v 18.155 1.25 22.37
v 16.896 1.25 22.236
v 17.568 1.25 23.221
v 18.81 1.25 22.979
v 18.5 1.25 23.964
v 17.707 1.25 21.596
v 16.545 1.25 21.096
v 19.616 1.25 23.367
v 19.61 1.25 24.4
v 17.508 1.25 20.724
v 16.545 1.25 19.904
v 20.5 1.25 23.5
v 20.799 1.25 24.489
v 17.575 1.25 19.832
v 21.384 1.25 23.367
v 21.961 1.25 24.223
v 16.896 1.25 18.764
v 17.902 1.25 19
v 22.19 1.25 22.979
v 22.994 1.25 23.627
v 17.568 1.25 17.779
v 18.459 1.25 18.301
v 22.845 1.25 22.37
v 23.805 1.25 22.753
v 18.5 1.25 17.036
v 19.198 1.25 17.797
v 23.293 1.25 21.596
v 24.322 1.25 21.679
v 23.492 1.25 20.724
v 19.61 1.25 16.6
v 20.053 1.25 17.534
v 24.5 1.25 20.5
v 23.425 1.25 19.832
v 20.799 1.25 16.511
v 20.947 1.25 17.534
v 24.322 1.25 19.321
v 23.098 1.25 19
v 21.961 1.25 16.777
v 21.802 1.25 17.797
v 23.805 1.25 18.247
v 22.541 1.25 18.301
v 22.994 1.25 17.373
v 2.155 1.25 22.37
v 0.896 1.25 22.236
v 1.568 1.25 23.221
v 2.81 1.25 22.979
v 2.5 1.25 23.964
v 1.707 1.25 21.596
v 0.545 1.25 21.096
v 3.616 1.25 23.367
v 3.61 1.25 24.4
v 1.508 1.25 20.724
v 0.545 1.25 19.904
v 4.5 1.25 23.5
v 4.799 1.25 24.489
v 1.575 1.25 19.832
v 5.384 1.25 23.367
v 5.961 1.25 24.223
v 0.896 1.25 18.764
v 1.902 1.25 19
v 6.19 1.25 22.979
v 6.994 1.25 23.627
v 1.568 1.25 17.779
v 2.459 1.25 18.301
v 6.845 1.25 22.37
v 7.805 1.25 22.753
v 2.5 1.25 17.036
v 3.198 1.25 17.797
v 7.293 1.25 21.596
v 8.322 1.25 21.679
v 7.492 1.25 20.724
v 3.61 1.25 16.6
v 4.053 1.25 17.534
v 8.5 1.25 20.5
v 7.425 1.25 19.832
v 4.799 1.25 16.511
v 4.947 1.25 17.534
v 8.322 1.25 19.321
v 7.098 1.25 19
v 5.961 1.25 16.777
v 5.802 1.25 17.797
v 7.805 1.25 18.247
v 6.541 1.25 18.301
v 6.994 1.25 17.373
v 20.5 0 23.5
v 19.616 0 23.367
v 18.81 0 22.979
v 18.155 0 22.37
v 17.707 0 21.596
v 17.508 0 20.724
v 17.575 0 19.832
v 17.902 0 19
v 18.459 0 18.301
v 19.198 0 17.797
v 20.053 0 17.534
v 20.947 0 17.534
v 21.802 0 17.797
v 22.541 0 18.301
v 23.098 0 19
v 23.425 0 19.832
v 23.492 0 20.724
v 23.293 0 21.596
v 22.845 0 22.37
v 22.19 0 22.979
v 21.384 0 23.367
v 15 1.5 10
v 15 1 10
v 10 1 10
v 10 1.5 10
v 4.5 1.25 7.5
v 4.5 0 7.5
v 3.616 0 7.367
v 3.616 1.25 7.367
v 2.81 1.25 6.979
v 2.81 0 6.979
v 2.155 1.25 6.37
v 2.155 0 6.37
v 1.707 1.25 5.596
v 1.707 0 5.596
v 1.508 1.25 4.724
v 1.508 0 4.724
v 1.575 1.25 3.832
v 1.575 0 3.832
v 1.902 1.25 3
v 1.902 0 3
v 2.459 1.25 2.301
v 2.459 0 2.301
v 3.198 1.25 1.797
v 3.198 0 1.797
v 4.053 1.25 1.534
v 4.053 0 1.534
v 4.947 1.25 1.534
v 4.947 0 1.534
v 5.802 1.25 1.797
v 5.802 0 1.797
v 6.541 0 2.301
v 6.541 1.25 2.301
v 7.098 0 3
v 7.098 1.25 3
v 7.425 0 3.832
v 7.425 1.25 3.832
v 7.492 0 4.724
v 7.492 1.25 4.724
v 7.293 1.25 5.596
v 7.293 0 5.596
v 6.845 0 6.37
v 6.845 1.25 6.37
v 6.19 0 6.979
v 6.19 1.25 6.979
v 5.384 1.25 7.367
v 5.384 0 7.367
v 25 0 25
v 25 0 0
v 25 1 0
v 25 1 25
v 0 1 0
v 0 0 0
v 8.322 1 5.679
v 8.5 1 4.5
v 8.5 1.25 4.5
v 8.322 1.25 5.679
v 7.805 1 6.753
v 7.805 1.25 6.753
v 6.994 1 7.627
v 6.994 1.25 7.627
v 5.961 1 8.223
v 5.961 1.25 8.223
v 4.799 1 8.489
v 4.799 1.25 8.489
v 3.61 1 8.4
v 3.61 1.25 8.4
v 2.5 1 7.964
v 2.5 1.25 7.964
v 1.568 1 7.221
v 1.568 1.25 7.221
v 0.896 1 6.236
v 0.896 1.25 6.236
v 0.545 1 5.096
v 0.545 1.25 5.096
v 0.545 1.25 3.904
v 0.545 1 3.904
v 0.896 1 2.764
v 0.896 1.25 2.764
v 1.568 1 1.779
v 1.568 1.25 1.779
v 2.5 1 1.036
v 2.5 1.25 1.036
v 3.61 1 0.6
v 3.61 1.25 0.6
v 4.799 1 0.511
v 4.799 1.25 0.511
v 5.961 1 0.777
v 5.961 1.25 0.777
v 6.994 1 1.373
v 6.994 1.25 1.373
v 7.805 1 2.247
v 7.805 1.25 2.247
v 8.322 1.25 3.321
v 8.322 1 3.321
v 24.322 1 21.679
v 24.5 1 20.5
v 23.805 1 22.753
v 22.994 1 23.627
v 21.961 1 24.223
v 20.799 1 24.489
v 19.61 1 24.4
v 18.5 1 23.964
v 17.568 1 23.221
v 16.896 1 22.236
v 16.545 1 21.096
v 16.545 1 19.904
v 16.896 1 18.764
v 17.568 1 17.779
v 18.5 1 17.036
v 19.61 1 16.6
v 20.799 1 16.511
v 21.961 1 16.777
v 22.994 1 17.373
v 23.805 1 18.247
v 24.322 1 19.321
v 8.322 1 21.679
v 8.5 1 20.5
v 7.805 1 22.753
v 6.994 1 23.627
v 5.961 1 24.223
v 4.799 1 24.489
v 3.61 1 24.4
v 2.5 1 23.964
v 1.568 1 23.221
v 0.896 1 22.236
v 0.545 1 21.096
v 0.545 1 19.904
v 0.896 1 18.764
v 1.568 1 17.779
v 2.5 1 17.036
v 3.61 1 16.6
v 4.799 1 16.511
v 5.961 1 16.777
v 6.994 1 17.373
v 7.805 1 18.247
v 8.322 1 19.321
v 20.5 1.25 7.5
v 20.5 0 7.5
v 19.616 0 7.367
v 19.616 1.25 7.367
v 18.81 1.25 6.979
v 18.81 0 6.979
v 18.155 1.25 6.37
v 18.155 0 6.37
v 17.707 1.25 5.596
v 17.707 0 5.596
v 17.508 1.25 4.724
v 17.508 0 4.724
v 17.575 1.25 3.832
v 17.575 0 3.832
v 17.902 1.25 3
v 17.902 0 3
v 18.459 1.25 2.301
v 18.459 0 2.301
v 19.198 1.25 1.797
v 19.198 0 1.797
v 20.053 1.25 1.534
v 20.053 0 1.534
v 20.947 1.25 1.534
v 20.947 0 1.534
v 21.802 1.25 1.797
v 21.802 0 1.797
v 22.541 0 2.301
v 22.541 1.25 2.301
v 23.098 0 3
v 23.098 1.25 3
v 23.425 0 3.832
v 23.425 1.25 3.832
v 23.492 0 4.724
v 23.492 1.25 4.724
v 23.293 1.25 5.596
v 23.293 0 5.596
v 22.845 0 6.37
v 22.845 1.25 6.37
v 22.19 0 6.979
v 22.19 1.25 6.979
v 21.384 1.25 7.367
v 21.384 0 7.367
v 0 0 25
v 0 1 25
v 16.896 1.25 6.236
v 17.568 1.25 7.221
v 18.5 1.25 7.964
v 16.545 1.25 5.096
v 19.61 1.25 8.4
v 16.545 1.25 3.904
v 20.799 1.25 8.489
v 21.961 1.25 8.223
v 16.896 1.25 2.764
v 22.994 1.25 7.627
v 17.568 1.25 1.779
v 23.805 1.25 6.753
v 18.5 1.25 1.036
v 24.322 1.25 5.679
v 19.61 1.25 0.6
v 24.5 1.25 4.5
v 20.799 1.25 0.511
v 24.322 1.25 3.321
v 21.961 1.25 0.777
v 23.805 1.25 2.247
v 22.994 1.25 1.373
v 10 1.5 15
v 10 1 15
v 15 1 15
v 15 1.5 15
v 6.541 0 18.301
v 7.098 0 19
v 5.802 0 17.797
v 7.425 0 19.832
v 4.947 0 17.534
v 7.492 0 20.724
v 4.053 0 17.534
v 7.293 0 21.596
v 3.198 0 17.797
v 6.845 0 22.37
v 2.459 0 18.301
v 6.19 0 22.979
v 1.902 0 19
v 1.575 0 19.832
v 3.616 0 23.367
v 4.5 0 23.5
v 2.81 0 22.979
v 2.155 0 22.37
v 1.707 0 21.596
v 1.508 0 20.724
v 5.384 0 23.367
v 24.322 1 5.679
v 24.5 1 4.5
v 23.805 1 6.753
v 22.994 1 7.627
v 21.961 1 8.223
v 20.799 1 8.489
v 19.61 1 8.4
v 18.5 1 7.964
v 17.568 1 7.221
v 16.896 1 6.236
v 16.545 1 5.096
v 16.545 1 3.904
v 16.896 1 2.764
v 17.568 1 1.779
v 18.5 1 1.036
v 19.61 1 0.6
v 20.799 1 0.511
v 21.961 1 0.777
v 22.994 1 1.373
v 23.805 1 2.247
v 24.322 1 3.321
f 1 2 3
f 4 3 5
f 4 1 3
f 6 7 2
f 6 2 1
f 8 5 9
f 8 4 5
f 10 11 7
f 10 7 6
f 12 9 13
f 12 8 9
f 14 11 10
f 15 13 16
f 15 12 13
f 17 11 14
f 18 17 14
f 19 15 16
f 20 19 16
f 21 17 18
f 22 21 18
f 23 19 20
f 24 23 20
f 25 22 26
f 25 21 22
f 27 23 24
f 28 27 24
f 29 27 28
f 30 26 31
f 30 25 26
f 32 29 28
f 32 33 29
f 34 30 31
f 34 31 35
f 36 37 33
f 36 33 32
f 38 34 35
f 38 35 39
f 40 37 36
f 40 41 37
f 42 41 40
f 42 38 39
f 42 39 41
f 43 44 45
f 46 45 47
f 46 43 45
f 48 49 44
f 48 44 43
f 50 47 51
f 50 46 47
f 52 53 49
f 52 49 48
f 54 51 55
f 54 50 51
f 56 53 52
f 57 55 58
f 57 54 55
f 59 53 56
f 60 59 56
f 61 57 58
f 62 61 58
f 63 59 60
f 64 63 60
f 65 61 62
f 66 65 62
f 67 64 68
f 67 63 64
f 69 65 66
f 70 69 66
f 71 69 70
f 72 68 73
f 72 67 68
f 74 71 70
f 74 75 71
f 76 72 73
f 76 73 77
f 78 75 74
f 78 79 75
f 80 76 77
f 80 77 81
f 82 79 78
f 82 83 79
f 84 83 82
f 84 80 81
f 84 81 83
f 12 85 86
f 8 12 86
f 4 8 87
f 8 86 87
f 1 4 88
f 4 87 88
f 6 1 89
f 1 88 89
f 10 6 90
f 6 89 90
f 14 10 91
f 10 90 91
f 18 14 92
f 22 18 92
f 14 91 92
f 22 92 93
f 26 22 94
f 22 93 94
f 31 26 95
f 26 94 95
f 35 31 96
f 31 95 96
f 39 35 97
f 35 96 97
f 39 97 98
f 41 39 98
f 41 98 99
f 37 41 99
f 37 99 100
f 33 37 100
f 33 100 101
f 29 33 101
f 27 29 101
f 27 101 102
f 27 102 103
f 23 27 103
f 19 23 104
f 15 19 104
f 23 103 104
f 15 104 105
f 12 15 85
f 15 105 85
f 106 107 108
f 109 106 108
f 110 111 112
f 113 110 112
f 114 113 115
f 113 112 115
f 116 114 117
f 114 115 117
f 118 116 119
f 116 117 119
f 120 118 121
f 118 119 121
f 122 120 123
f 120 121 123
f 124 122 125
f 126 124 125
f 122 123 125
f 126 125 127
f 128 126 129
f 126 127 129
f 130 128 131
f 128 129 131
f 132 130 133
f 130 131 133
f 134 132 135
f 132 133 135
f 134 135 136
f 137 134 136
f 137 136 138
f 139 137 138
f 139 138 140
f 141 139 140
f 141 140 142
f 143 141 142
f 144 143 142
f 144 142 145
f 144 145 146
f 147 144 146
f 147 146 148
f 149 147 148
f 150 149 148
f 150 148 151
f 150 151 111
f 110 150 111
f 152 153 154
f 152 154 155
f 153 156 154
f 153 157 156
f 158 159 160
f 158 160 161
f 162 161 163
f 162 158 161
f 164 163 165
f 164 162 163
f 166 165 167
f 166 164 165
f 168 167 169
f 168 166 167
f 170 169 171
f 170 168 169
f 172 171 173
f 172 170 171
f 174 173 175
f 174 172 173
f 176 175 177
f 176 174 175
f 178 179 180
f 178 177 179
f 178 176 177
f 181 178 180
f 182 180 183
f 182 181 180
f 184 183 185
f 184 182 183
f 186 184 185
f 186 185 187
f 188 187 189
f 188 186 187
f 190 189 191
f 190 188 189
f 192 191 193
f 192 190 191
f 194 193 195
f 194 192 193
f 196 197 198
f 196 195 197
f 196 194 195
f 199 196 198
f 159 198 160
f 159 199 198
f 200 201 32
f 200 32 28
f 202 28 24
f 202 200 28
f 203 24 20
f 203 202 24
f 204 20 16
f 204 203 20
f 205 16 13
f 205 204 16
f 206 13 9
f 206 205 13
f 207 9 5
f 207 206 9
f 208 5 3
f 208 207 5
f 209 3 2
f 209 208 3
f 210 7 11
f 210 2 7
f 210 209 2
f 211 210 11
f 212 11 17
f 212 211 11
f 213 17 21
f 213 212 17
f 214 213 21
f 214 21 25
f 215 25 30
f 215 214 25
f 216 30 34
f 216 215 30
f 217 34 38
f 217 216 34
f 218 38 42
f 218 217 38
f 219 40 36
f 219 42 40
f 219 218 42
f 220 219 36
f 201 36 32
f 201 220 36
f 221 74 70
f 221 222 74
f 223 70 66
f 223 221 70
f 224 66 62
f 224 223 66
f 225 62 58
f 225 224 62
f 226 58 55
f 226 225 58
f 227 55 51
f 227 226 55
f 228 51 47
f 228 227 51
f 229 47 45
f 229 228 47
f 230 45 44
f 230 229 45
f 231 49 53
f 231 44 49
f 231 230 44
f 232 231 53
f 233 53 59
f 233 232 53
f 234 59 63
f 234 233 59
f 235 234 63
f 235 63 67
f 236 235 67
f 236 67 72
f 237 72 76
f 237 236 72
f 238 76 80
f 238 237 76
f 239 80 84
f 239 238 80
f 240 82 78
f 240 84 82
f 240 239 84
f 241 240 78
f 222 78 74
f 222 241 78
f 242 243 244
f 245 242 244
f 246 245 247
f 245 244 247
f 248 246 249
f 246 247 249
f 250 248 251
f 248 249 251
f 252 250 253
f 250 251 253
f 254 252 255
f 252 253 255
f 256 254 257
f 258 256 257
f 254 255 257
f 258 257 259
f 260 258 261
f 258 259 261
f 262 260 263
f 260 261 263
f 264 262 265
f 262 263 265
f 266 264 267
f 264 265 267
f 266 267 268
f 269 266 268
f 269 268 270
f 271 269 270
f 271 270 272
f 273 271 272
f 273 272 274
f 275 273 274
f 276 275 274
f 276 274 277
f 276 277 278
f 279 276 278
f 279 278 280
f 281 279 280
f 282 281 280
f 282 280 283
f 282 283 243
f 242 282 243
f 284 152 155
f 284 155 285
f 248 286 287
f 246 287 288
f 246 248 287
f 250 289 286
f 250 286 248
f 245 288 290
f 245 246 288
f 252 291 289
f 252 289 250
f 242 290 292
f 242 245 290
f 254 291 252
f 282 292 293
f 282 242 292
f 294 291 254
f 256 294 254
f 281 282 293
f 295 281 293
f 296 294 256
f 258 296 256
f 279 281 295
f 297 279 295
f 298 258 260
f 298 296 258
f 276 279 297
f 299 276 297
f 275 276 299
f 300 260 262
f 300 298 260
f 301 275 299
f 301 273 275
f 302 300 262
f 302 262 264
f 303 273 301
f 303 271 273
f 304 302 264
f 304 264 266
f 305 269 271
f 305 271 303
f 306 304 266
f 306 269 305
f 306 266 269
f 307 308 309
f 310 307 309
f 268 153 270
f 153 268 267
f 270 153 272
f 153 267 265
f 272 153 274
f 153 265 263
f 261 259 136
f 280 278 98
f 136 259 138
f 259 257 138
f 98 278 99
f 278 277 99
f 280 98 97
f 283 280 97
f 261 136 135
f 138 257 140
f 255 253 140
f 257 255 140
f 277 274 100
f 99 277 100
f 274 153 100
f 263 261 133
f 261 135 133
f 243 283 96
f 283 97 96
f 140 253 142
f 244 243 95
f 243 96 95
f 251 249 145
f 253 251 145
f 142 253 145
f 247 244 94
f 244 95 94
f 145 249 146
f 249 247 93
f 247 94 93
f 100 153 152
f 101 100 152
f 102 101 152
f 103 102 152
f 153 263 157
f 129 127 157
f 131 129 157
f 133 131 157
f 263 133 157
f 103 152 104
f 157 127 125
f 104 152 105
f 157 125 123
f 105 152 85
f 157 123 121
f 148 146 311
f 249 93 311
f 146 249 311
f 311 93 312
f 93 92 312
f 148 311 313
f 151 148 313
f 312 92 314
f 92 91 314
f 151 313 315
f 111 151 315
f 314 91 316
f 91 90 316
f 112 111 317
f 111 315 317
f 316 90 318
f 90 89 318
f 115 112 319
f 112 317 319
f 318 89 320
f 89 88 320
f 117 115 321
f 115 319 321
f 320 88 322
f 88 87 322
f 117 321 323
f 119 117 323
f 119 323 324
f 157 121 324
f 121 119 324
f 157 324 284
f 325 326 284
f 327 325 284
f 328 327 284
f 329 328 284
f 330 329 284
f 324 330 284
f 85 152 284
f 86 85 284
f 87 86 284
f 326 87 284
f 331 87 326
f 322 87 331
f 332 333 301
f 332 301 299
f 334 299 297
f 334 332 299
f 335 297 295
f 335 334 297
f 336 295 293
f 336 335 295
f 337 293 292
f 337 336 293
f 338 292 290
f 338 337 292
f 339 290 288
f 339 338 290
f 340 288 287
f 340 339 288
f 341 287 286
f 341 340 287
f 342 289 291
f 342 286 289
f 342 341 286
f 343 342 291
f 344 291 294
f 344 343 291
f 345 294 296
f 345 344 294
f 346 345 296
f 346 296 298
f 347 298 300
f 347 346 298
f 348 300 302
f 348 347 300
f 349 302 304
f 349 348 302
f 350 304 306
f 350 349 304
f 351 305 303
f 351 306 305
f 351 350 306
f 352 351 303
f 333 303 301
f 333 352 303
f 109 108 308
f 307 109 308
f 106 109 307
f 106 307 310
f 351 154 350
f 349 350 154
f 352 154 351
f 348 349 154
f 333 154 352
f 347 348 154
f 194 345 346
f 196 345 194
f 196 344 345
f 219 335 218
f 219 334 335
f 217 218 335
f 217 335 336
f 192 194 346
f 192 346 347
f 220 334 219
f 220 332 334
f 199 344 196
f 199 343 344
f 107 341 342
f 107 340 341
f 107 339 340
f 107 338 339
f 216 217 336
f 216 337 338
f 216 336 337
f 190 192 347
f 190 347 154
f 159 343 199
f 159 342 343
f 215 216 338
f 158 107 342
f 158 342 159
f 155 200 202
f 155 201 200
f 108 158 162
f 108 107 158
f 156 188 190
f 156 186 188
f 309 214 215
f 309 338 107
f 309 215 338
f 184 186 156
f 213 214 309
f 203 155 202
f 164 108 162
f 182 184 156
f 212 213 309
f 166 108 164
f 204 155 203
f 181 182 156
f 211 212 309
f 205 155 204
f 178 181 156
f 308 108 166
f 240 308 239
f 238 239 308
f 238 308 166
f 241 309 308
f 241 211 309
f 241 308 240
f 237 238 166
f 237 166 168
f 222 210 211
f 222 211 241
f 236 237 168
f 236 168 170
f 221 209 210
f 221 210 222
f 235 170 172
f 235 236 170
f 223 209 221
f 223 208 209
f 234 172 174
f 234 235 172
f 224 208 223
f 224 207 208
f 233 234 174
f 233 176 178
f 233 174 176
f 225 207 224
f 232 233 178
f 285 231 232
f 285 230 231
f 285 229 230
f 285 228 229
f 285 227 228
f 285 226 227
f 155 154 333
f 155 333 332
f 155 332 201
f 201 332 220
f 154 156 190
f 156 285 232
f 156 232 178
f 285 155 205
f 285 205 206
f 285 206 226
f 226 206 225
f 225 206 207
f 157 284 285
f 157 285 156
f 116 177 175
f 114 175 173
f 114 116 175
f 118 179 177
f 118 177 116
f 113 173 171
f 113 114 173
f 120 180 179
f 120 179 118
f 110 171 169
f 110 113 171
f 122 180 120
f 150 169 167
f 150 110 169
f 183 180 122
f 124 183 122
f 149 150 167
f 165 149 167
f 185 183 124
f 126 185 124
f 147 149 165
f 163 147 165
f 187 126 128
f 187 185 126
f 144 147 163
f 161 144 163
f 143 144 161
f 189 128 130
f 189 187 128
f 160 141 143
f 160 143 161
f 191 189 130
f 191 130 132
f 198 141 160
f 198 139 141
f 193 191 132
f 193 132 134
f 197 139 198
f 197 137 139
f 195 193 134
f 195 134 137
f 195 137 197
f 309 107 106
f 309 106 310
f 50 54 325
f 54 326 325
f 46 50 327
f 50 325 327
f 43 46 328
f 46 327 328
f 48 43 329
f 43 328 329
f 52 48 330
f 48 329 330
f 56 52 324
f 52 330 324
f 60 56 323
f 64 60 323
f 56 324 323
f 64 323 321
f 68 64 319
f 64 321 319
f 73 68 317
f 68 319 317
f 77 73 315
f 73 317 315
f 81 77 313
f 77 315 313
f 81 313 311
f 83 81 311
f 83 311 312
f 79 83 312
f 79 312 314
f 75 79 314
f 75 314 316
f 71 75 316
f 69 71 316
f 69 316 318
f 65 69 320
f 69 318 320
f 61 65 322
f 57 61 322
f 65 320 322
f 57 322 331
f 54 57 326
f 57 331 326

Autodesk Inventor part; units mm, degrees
ref_plane "YZ Plane" through (0, 0, 0) normal (1, 0, 0) x (0, 1, 0)
ref_plane "XZ Plane" through (0, 0, 0) normal (0, 1, 0) x (-1, 0, 0)
ref_plane "XY Plane" through (0, 0, 0) normal (0, 0, 1) x (1, 0, 0)
sketch "Sketch1" plane through (0, 0, 0) normal (0, 1, 0) x (-1, 0, 0)
  line L0 (0, 0) -> (-25, 0)
  line L1 (-25, 0) -> (-25, 25)
  line L2 (-25, 25) -> (0, 25)
  line L3 (0, 25) -> (0, 0)
  circle A0 centre (-4.5, 4.5) radius 3
  circle A1 centre (-4.5, 20.5) radius 3
  circle A2 centre (-20.5, 20.5) radius 3
  circle A3 centre (-20.5, 4.5) radius 3
  dimension "d0" = 25
  dimension "d1" = 25
  dimension "d8" = 6
  dimension "d9" = 6
  dimension "d10" = 6
  dimension "d11" = 6
extrude "Extrusion1" add sketch "Sketch1" along normal blind 1 contours L0 L1 L2 L3 | A0 | A1 | A2 | A3
sketch "Sketch2" plane through (0, 1, 0) normal (0, 1, 0) x (1, 0, 0)
  line L0 (10, -12.5) -> (10, -15)
  line L1 (10, -15) -> (12.5, -15)
  line L2 (10, -12.5) -> (10, -10)
  line L3 (10, -10) -> (12.5, -10)
  line L4 (15, -12.5) -> (15, -15)
  line L5 (15, -15) -> (12.5, -15)
  line L6 (15, -12.5) -> (15, -10)
  line L7 (15, -10) -> (12.5, -10)
  point P0 (0, 0)
  dimension "d18" = 2.5
  dimension "d19" = 2.5
  dimension "d20" = 2.5
  dimension "d21" = 2.5
  dimension "d22" = 2.5
  dimension "d23" = 2.5
extrude "Extrusion2" add sketch "Sketch2" along normal blind 0.5
sketch "Sketch6" plane through (0, 1, 0) normal (0, 1, 0) x (1, 0, 0)
  circle A0 centre (4.5, -4.5) radius 4
  circle A1 centre (20.5, -4.5) radius 4
  circle A2 centre (4.5, -20.5) radius 4
  circle A3 centre (20.5, -20.5) radius 4
  point P0 (0, 0)
  dimension "d43" = 8
  dimension "d44" = 8
  dimension "d45" = 8
  dimension "d46" = 8
extrude "Extrusion4" add sketch "Sketch6" along normal blind 0.25
sketch "Sketch7" plane through (4.5, 1.25, 20.5) normal (0, 1, 0) x (1, 0, 0)
  circle A0 centre (0, 0) radius 3
  point P0 (-4.5, 20.5)
  dimension "d49" = 6
hole "Hole2" at (4.5, 1.25, 20.5) direction (0, -1, 0) diameter 6 depth 1.25
sketch "Sketch8" plane through (4.5, 1.25, 4.5) normal (0, 1, 0) x (1, 0, 0)
  circle A0 centre (0, 0) radius 3
  point P0 (-4.5, 4.5)
  dimension "d57" = 6
hole "Hole3" at (4.5, 1.25, 4.5) direction (0, -1, 0) diameter 6 depth 1.25
sketch "Sketch9" plane through (20.5, 1.25, 20.5) normal (0, 1, 0) x (1, 0, 0)
  circle A0 centre (0, 0) radius 3
  point P0 (-20.5, 20.5)
  dimension "d65" = 6
hole "Hole4" at (20.5, 1.25, 20.5) direction (0, -1, 0) diameter 6 depth 1.25
sketch "Sketch10" plane through (20.5, 1.25, 4.5) normal (0, 1, 0) x (1, 0, 0)
  circle A0 centre (0, 0) radius 3
  point P0 (-20.5, 4.5)
  dimension "d73" = 6
hole "Hole5" at (20.5, 1.25, 4.5) direction (0, -1, 0) diameter 6 depth 1.25
properties part number "SiPM"
